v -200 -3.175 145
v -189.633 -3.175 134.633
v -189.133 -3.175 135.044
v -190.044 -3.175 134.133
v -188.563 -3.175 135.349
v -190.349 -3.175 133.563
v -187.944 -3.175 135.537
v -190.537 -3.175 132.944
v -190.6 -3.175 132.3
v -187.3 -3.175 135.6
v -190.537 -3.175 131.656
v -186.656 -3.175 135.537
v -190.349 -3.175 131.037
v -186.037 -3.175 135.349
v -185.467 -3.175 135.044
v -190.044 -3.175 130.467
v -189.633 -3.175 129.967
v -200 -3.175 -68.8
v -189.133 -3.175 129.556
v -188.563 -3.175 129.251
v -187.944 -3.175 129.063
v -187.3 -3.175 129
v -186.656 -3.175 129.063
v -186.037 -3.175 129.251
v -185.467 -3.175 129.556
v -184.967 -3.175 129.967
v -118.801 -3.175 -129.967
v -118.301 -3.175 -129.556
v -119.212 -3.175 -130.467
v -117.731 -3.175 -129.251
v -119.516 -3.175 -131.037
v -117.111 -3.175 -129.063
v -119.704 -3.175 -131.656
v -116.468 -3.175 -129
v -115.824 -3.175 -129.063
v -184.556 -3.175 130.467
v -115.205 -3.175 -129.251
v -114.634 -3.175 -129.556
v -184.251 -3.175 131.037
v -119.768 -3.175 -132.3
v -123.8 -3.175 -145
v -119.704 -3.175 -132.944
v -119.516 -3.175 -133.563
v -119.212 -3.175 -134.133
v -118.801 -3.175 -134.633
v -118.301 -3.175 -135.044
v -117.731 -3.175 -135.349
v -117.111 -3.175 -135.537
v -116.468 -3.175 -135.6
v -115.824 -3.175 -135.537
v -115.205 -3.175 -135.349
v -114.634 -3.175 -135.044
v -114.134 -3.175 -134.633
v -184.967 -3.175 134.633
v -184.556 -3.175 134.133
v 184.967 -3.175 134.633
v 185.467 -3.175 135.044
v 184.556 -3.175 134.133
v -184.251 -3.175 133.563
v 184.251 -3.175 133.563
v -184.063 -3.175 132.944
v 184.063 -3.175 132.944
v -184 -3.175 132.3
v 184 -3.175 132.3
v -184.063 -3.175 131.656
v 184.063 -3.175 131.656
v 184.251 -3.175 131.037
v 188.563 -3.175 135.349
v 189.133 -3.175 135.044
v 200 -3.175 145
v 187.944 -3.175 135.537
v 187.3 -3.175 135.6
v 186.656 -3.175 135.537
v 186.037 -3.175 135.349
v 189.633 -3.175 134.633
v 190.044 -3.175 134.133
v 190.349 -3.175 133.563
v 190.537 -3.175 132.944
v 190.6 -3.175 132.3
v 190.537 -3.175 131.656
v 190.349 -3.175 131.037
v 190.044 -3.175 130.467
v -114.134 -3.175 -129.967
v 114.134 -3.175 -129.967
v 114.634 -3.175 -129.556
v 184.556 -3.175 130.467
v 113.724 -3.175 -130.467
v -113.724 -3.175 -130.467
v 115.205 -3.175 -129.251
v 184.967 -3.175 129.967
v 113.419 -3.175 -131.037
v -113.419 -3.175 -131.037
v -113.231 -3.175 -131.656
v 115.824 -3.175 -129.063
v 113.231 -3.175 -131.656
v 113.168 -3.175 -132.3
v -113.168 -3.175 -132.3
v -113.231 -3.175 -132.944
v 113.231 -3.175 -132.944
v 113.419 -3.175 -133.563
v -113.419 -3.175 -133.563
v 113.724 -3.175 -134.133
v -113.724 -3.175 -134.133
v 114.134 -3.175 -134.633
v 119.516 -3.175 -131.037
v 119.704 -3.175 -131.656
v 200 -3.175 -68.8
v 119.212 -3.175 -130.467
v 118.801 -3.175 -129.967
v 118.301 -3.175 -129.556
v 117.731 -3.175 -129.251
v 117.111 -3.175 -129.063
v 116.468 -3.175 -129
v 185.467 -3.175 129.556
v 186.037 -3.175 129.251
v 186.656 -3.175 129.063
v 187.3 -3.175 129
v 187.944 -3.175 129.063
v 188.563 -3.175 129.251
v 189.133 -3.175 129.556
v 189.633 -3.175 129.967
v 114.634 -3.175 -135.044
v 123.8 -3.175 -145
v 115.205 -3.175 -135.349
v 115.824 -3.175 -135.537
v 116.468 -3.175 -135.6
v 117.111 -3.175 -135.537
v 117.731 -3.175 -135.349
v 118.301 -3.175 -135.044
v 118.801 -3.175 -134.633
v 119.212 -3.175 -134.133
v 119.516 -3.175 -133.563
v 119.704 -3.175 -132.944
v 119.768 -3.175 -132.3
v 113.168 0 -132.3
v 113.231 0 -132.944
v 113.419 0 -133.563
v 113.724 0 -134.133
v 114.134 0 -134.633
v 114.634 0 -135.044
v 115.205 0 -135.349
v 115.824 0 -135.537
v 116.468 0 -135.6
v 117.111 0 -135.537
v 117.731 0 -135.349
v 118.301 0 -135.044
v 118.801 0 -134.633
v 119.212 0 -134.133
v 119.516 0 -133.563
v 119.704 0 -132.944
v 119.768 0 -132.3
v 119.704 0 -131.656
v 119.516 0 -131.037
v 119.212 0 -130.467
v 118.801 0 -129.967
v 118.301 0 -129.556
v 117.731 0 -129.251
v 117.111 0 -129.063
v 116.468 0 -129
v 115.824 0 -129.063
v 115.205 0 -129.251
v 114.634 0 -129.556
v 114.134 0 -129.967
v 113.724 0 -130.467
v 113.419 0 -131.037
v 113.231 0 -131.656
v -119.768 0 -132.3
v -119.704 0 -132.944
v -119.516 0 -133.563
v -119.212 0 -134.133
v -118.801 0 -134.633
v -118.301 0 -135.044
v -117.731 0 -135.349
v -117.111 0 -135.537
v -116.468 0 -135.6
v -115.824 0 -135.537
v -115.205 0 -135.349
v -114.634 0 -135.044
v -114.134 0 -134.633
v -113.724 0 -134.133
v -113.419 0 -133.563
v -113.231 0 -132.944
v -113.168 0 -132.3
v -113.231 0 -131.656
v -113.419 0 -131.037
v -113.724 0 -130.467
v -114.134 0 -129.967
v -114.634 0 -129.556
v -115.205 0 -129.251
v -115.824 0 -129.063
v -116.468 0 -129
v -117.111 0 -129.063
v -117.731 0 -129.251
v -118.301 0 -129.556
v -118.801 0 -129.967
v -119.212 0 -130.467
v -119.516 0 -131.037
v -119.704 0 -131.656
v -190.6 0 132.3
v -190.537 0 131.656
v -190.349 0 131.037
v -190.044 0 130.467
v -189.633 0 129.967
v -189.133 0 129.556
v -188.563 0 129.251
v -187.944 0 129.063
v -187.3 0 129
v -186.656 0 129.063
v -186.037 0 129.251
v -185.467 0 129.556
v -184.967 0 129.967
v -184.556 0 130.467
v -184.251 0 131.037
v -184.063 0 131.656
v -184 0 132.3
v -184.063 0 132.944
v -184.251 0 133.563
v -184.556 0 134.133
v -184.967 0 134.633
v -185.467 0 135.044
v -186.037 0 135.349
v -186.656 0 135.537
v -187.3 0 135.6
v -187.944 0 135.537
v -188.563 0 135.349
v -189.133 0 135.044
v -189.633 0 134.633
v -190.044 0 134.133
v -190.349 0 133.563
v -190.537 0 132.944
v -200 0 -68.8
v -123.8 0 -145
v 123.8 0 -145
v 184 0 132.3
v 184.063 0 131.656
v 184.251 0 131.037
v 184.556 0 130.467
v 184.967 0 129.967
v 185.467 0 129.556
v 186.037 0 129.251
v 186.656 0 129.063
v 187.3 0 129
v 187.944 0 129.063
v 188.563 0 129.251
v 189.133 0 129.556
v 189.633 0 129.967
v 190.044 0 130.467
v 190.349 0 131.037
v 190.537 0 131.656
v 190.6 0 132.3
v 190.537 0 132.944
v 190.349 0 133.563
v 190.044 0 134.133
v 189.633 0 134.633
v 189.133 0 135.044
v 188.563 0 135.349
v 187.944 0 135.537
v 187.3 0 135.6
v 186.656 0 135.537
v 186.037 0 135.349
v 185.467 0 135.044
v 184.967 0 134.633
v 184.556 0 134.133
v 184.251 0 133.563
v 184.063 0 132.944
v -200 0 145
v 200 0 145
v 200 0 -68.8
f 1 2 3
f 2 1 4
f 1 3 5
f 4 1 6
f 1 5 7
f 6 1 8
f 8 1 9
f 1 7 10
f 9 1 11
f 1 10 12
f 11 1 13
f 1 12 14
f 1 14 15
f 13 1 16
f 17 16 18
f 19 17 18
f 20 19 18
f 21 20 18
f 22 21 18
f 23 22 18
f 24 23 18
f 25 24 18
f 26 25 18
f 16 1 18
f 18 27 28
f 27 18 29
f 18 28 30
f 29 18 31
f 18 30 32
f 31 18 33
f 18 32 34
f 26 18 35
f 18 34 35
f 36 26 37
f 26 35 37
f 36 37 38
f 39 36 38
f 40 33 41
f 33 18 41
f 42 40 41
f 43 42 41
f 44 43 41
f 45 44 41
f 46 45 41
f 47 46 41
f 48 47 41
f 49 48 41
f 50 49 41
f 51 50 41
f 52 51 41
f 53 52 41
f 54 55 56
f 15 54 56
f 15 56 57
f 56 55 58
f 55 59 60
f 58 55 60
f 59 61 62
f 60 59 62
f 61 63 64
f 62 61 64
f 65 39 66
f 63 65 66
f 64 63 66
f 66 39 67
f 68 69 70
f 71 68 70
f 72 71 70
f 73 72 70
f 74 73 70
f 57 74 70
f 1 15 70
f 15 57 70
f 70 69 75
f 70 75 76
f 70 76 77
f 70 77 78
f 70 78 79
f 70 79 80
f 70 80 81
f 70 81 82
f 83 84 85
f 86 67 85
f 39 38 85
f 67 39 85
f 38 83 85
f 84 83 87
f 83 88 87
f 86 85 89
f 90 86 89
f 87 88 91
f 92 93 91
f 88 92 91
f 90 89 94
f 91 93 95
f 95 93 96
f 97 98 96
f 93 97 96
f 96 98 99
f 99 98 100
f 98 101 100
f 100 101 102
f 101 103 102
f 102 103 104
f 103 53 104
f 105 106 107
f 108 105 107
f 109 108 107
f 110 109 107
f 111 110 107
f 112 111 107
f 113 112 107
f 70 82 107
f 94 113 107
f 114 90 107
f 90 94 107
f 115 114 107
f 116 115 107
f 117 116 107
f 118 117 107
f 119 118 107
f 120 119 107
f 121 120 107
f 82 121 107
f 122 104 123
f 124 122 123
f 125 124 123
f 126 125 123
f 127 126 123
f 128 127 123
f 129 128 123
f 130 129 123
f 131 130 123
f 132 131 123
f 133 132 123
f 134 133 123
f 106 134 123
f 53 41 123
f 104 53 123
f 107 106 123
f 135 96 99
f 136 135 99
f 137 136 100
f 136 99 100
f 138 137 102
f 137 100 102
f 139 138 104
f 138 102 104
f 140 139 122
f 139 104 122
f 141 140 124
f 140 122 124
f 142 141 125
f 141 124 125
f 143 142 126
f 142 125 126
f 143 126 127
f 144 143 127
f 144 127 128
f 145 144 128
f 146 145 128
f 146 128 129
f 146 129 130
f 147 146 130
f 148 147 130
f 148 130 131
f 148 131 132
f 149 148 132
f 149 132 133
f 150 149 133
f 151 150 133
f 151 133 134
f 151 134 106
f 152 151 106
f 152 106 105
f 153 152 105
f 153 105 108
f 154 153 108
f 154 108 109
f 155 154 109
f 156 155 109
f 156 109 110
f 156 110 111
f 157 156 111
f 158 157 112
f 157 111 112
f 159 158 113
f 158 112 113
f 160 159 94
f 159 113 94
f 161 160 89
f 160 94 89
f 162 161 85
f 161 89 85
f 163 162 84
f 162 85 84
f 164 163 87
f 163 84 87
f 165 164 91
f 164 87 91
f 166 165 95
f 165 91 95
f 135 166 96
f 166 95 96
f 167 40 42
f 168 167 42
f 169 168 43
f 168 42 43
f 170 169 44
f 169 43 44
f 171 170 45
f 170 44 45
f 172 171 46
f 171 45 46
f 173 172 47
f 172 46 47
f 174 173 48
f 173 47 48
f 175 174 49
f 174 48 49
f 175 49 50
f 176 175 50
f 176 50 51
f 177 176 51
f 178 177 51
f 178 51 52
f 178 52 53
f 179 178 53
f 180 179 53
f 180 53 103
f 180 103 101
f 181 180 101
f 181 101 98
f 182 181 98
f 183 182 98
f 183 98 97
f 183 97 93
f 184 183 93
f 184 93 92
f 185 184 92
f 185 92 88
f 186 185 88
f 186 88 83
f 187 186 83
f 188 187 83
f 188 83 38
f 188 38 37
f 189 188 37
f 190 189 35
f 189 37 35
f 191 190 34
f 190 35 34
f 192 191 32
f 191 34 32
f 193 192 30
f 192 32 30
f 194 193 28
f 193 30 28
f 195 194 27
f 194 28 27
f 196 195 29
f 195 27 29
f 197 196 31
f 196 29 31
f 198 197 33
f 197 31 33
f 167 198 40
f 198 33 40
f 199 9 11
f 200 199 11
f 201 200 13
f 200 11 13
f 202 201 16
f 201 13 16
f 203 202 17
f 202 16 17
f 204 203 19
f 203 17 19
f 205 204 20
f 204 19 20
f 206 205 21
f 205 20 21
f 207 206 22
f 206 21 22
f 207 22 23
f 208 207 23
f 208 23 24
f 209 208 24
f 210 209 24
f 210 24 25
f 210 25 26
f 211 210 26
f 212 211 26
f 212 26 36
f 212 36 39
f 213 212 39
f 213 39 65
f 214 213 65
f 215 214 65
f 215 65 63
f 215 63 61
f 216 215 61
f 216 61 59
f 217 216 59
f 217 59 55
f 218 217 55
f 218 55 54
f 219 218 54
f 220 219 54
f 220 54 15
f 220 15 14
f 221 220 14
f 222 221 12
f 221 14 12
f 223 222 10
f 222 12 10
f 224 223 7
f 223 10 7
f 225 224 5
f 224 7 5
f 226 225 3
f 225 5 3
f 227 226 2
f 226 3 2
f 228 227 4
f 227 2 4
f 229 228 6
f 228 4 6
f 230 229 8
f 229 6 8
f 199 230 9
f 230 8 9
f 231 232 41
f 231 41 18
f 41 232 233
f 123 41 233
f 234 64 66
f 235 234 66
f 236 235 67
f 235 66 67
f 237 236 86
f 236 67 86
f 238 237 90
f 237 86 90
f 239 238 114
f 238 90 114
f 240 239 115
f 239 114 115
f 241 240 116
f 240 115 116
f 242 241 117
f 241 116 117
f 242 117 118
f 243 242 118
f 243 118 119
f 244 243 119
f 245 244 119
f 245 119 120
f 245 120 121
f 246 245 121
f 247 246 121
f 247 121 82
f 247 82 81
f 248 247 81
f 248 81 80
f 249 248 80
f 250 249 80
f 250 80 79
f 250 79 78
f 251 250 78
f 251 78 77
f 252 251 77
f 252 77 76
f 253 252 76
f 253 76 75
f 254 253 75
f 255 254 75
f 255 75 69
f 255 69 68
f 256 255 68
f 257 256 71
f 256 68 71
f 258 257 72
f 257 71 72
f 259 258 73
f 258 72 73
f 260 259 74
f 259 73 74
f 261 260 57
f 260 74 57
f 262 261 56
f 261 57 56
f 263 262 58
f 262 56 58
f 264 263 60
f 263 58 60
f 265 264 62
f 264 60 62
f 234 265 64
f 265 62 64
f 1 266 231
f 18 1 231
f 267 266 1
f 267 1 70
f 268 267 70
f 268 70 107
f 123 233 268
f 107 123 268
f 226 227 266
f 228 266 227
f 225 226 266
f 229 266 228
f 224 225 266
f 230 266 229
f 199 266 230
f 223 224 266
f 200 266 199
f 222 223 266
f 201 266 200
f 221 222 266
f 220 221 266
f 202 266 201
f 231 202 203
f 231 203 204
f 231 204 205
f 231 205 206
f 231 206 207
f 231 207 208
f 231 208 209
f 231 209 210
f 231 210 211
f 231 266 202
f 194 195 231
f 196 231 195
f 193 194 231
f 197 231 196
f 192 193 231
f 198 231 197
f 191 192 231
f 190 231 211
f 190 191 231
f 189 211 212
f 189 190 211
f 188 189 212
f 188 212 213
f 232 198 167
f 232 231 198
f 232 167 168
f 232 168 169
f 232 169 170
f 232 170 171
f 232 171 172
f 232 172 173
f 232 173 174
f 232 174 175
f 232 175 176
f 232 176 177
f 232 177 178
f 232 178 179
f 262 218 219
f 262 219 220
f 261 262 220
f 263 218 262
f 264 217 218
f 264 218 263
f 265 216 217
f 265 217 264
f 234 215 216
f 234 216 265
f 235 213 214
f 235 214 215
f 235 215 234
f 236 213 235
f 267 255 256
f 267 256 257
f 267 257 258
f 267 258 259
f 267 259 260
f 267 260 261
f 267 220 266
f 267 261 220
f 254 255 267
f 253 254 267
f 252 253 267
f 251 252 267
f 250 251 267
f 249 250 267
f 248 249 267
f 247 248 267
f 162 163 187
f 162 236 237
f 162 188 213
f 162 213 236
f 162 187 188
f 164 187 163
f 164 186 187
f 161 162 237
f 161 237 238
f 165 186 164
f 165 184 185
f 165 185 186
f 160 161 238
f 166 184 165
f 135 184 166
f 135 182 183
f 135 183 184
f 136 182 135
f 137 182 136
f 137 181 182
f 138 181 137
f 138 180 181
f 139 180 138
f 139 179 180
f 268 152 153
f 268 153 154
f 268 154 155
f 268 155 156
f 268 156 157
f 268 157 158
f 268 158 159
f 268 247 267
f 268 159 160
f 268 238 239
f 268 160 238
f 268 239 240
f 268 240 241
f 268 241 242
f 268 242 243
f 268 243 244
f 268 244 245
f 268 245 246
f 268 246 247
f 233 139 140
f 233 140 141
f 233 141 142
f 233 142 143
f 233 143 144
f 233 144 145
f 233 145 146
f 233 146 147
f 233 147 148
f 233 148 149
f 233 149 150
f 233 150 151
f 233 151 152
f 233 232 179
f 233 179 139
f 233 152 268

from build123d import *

# Parameters (mm, degrees)
SKETCH2_W                = 400
SKETCH2_H                = 290
BASE_FLANGE1_DEPTH       = 3.175
CUT_EXTRUDE1_DEPTH       = 10
M6_CLEARANCE_HOLE1_D     = 6.6
M6_CLEARANCE_HOLE1_DEPTH = 18.75
M6_CLEARANCE_HOLE1_TIP   = 1.982840043


# Sheet-metal steps are written as plain solids
with BuildPart() as part:
    # Sketch2 (on Top Plane) → Base-Flange1 (new body)
    with BuildSketch(Plane(origin=(0, 0, 0), x_dir=(1, 0, 0), z_dir=(0, 1, 0))):
        Rectangle(SKETCH2_W, SKETCH2_H)
    extrude(amount=-BASE_FLANGE1_DEPTH)

    # Sketch10 → Cut-Extrude1 (cut)
    with BuildSketch(Plane(origin=(0, 0, 0), x_dir=(1, 0, 0), z_dir=(0, 1, 0))):
        Polygon((200, 68.8), (200, 145), (123.8, 145), align=None)
        Polygon((-200, 145), (-123.8, 145), (-200, 68.8), align=None)
    extrude(amount=-CUT_EXTRUDE1_DEPTH, mode=Mode.SUBTRACT)

    # M6 Clearance Hole1
    with Locations(Plane(origin=(0, 0, 0), x_dir=(1, 0, 0), z_dir=(0, 1, 0))):
        with Locations((-187.3, -132.3), (187.3, -132.3), (116.467651581, 132.3), (-116.467651581, 132.3)):
            Hole(M6_CLEARANCE_HOLE1_D / 2, depth=M6_CLEARANCE_HOLE1_DEPTH)
            with Locations((0, 0, -(M6_CLEARANCE_HOLE1_DEPTH + M6_CLEARANCE_HOLE1_TIP / 2))):  # 118° drill point
                Cone(0, M6_CLEARANCE_HOLE1_D / 2, M6_CLEARANCE_HOLE1_TIP, mode=Mode.SUBTRACT)


solid = part.part
